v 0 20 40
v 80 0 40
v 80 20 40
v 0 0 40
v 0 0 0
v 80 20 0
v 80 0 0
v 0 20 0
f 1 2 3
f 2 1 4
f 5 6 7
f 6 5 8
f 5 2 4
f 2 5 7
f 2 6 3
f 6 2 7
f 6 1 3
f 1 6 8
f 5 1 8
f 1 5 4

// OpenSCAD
module main_cube() {
    cube(size=[80, 20, 40]);
}

// call module when run directly
main_cube();
